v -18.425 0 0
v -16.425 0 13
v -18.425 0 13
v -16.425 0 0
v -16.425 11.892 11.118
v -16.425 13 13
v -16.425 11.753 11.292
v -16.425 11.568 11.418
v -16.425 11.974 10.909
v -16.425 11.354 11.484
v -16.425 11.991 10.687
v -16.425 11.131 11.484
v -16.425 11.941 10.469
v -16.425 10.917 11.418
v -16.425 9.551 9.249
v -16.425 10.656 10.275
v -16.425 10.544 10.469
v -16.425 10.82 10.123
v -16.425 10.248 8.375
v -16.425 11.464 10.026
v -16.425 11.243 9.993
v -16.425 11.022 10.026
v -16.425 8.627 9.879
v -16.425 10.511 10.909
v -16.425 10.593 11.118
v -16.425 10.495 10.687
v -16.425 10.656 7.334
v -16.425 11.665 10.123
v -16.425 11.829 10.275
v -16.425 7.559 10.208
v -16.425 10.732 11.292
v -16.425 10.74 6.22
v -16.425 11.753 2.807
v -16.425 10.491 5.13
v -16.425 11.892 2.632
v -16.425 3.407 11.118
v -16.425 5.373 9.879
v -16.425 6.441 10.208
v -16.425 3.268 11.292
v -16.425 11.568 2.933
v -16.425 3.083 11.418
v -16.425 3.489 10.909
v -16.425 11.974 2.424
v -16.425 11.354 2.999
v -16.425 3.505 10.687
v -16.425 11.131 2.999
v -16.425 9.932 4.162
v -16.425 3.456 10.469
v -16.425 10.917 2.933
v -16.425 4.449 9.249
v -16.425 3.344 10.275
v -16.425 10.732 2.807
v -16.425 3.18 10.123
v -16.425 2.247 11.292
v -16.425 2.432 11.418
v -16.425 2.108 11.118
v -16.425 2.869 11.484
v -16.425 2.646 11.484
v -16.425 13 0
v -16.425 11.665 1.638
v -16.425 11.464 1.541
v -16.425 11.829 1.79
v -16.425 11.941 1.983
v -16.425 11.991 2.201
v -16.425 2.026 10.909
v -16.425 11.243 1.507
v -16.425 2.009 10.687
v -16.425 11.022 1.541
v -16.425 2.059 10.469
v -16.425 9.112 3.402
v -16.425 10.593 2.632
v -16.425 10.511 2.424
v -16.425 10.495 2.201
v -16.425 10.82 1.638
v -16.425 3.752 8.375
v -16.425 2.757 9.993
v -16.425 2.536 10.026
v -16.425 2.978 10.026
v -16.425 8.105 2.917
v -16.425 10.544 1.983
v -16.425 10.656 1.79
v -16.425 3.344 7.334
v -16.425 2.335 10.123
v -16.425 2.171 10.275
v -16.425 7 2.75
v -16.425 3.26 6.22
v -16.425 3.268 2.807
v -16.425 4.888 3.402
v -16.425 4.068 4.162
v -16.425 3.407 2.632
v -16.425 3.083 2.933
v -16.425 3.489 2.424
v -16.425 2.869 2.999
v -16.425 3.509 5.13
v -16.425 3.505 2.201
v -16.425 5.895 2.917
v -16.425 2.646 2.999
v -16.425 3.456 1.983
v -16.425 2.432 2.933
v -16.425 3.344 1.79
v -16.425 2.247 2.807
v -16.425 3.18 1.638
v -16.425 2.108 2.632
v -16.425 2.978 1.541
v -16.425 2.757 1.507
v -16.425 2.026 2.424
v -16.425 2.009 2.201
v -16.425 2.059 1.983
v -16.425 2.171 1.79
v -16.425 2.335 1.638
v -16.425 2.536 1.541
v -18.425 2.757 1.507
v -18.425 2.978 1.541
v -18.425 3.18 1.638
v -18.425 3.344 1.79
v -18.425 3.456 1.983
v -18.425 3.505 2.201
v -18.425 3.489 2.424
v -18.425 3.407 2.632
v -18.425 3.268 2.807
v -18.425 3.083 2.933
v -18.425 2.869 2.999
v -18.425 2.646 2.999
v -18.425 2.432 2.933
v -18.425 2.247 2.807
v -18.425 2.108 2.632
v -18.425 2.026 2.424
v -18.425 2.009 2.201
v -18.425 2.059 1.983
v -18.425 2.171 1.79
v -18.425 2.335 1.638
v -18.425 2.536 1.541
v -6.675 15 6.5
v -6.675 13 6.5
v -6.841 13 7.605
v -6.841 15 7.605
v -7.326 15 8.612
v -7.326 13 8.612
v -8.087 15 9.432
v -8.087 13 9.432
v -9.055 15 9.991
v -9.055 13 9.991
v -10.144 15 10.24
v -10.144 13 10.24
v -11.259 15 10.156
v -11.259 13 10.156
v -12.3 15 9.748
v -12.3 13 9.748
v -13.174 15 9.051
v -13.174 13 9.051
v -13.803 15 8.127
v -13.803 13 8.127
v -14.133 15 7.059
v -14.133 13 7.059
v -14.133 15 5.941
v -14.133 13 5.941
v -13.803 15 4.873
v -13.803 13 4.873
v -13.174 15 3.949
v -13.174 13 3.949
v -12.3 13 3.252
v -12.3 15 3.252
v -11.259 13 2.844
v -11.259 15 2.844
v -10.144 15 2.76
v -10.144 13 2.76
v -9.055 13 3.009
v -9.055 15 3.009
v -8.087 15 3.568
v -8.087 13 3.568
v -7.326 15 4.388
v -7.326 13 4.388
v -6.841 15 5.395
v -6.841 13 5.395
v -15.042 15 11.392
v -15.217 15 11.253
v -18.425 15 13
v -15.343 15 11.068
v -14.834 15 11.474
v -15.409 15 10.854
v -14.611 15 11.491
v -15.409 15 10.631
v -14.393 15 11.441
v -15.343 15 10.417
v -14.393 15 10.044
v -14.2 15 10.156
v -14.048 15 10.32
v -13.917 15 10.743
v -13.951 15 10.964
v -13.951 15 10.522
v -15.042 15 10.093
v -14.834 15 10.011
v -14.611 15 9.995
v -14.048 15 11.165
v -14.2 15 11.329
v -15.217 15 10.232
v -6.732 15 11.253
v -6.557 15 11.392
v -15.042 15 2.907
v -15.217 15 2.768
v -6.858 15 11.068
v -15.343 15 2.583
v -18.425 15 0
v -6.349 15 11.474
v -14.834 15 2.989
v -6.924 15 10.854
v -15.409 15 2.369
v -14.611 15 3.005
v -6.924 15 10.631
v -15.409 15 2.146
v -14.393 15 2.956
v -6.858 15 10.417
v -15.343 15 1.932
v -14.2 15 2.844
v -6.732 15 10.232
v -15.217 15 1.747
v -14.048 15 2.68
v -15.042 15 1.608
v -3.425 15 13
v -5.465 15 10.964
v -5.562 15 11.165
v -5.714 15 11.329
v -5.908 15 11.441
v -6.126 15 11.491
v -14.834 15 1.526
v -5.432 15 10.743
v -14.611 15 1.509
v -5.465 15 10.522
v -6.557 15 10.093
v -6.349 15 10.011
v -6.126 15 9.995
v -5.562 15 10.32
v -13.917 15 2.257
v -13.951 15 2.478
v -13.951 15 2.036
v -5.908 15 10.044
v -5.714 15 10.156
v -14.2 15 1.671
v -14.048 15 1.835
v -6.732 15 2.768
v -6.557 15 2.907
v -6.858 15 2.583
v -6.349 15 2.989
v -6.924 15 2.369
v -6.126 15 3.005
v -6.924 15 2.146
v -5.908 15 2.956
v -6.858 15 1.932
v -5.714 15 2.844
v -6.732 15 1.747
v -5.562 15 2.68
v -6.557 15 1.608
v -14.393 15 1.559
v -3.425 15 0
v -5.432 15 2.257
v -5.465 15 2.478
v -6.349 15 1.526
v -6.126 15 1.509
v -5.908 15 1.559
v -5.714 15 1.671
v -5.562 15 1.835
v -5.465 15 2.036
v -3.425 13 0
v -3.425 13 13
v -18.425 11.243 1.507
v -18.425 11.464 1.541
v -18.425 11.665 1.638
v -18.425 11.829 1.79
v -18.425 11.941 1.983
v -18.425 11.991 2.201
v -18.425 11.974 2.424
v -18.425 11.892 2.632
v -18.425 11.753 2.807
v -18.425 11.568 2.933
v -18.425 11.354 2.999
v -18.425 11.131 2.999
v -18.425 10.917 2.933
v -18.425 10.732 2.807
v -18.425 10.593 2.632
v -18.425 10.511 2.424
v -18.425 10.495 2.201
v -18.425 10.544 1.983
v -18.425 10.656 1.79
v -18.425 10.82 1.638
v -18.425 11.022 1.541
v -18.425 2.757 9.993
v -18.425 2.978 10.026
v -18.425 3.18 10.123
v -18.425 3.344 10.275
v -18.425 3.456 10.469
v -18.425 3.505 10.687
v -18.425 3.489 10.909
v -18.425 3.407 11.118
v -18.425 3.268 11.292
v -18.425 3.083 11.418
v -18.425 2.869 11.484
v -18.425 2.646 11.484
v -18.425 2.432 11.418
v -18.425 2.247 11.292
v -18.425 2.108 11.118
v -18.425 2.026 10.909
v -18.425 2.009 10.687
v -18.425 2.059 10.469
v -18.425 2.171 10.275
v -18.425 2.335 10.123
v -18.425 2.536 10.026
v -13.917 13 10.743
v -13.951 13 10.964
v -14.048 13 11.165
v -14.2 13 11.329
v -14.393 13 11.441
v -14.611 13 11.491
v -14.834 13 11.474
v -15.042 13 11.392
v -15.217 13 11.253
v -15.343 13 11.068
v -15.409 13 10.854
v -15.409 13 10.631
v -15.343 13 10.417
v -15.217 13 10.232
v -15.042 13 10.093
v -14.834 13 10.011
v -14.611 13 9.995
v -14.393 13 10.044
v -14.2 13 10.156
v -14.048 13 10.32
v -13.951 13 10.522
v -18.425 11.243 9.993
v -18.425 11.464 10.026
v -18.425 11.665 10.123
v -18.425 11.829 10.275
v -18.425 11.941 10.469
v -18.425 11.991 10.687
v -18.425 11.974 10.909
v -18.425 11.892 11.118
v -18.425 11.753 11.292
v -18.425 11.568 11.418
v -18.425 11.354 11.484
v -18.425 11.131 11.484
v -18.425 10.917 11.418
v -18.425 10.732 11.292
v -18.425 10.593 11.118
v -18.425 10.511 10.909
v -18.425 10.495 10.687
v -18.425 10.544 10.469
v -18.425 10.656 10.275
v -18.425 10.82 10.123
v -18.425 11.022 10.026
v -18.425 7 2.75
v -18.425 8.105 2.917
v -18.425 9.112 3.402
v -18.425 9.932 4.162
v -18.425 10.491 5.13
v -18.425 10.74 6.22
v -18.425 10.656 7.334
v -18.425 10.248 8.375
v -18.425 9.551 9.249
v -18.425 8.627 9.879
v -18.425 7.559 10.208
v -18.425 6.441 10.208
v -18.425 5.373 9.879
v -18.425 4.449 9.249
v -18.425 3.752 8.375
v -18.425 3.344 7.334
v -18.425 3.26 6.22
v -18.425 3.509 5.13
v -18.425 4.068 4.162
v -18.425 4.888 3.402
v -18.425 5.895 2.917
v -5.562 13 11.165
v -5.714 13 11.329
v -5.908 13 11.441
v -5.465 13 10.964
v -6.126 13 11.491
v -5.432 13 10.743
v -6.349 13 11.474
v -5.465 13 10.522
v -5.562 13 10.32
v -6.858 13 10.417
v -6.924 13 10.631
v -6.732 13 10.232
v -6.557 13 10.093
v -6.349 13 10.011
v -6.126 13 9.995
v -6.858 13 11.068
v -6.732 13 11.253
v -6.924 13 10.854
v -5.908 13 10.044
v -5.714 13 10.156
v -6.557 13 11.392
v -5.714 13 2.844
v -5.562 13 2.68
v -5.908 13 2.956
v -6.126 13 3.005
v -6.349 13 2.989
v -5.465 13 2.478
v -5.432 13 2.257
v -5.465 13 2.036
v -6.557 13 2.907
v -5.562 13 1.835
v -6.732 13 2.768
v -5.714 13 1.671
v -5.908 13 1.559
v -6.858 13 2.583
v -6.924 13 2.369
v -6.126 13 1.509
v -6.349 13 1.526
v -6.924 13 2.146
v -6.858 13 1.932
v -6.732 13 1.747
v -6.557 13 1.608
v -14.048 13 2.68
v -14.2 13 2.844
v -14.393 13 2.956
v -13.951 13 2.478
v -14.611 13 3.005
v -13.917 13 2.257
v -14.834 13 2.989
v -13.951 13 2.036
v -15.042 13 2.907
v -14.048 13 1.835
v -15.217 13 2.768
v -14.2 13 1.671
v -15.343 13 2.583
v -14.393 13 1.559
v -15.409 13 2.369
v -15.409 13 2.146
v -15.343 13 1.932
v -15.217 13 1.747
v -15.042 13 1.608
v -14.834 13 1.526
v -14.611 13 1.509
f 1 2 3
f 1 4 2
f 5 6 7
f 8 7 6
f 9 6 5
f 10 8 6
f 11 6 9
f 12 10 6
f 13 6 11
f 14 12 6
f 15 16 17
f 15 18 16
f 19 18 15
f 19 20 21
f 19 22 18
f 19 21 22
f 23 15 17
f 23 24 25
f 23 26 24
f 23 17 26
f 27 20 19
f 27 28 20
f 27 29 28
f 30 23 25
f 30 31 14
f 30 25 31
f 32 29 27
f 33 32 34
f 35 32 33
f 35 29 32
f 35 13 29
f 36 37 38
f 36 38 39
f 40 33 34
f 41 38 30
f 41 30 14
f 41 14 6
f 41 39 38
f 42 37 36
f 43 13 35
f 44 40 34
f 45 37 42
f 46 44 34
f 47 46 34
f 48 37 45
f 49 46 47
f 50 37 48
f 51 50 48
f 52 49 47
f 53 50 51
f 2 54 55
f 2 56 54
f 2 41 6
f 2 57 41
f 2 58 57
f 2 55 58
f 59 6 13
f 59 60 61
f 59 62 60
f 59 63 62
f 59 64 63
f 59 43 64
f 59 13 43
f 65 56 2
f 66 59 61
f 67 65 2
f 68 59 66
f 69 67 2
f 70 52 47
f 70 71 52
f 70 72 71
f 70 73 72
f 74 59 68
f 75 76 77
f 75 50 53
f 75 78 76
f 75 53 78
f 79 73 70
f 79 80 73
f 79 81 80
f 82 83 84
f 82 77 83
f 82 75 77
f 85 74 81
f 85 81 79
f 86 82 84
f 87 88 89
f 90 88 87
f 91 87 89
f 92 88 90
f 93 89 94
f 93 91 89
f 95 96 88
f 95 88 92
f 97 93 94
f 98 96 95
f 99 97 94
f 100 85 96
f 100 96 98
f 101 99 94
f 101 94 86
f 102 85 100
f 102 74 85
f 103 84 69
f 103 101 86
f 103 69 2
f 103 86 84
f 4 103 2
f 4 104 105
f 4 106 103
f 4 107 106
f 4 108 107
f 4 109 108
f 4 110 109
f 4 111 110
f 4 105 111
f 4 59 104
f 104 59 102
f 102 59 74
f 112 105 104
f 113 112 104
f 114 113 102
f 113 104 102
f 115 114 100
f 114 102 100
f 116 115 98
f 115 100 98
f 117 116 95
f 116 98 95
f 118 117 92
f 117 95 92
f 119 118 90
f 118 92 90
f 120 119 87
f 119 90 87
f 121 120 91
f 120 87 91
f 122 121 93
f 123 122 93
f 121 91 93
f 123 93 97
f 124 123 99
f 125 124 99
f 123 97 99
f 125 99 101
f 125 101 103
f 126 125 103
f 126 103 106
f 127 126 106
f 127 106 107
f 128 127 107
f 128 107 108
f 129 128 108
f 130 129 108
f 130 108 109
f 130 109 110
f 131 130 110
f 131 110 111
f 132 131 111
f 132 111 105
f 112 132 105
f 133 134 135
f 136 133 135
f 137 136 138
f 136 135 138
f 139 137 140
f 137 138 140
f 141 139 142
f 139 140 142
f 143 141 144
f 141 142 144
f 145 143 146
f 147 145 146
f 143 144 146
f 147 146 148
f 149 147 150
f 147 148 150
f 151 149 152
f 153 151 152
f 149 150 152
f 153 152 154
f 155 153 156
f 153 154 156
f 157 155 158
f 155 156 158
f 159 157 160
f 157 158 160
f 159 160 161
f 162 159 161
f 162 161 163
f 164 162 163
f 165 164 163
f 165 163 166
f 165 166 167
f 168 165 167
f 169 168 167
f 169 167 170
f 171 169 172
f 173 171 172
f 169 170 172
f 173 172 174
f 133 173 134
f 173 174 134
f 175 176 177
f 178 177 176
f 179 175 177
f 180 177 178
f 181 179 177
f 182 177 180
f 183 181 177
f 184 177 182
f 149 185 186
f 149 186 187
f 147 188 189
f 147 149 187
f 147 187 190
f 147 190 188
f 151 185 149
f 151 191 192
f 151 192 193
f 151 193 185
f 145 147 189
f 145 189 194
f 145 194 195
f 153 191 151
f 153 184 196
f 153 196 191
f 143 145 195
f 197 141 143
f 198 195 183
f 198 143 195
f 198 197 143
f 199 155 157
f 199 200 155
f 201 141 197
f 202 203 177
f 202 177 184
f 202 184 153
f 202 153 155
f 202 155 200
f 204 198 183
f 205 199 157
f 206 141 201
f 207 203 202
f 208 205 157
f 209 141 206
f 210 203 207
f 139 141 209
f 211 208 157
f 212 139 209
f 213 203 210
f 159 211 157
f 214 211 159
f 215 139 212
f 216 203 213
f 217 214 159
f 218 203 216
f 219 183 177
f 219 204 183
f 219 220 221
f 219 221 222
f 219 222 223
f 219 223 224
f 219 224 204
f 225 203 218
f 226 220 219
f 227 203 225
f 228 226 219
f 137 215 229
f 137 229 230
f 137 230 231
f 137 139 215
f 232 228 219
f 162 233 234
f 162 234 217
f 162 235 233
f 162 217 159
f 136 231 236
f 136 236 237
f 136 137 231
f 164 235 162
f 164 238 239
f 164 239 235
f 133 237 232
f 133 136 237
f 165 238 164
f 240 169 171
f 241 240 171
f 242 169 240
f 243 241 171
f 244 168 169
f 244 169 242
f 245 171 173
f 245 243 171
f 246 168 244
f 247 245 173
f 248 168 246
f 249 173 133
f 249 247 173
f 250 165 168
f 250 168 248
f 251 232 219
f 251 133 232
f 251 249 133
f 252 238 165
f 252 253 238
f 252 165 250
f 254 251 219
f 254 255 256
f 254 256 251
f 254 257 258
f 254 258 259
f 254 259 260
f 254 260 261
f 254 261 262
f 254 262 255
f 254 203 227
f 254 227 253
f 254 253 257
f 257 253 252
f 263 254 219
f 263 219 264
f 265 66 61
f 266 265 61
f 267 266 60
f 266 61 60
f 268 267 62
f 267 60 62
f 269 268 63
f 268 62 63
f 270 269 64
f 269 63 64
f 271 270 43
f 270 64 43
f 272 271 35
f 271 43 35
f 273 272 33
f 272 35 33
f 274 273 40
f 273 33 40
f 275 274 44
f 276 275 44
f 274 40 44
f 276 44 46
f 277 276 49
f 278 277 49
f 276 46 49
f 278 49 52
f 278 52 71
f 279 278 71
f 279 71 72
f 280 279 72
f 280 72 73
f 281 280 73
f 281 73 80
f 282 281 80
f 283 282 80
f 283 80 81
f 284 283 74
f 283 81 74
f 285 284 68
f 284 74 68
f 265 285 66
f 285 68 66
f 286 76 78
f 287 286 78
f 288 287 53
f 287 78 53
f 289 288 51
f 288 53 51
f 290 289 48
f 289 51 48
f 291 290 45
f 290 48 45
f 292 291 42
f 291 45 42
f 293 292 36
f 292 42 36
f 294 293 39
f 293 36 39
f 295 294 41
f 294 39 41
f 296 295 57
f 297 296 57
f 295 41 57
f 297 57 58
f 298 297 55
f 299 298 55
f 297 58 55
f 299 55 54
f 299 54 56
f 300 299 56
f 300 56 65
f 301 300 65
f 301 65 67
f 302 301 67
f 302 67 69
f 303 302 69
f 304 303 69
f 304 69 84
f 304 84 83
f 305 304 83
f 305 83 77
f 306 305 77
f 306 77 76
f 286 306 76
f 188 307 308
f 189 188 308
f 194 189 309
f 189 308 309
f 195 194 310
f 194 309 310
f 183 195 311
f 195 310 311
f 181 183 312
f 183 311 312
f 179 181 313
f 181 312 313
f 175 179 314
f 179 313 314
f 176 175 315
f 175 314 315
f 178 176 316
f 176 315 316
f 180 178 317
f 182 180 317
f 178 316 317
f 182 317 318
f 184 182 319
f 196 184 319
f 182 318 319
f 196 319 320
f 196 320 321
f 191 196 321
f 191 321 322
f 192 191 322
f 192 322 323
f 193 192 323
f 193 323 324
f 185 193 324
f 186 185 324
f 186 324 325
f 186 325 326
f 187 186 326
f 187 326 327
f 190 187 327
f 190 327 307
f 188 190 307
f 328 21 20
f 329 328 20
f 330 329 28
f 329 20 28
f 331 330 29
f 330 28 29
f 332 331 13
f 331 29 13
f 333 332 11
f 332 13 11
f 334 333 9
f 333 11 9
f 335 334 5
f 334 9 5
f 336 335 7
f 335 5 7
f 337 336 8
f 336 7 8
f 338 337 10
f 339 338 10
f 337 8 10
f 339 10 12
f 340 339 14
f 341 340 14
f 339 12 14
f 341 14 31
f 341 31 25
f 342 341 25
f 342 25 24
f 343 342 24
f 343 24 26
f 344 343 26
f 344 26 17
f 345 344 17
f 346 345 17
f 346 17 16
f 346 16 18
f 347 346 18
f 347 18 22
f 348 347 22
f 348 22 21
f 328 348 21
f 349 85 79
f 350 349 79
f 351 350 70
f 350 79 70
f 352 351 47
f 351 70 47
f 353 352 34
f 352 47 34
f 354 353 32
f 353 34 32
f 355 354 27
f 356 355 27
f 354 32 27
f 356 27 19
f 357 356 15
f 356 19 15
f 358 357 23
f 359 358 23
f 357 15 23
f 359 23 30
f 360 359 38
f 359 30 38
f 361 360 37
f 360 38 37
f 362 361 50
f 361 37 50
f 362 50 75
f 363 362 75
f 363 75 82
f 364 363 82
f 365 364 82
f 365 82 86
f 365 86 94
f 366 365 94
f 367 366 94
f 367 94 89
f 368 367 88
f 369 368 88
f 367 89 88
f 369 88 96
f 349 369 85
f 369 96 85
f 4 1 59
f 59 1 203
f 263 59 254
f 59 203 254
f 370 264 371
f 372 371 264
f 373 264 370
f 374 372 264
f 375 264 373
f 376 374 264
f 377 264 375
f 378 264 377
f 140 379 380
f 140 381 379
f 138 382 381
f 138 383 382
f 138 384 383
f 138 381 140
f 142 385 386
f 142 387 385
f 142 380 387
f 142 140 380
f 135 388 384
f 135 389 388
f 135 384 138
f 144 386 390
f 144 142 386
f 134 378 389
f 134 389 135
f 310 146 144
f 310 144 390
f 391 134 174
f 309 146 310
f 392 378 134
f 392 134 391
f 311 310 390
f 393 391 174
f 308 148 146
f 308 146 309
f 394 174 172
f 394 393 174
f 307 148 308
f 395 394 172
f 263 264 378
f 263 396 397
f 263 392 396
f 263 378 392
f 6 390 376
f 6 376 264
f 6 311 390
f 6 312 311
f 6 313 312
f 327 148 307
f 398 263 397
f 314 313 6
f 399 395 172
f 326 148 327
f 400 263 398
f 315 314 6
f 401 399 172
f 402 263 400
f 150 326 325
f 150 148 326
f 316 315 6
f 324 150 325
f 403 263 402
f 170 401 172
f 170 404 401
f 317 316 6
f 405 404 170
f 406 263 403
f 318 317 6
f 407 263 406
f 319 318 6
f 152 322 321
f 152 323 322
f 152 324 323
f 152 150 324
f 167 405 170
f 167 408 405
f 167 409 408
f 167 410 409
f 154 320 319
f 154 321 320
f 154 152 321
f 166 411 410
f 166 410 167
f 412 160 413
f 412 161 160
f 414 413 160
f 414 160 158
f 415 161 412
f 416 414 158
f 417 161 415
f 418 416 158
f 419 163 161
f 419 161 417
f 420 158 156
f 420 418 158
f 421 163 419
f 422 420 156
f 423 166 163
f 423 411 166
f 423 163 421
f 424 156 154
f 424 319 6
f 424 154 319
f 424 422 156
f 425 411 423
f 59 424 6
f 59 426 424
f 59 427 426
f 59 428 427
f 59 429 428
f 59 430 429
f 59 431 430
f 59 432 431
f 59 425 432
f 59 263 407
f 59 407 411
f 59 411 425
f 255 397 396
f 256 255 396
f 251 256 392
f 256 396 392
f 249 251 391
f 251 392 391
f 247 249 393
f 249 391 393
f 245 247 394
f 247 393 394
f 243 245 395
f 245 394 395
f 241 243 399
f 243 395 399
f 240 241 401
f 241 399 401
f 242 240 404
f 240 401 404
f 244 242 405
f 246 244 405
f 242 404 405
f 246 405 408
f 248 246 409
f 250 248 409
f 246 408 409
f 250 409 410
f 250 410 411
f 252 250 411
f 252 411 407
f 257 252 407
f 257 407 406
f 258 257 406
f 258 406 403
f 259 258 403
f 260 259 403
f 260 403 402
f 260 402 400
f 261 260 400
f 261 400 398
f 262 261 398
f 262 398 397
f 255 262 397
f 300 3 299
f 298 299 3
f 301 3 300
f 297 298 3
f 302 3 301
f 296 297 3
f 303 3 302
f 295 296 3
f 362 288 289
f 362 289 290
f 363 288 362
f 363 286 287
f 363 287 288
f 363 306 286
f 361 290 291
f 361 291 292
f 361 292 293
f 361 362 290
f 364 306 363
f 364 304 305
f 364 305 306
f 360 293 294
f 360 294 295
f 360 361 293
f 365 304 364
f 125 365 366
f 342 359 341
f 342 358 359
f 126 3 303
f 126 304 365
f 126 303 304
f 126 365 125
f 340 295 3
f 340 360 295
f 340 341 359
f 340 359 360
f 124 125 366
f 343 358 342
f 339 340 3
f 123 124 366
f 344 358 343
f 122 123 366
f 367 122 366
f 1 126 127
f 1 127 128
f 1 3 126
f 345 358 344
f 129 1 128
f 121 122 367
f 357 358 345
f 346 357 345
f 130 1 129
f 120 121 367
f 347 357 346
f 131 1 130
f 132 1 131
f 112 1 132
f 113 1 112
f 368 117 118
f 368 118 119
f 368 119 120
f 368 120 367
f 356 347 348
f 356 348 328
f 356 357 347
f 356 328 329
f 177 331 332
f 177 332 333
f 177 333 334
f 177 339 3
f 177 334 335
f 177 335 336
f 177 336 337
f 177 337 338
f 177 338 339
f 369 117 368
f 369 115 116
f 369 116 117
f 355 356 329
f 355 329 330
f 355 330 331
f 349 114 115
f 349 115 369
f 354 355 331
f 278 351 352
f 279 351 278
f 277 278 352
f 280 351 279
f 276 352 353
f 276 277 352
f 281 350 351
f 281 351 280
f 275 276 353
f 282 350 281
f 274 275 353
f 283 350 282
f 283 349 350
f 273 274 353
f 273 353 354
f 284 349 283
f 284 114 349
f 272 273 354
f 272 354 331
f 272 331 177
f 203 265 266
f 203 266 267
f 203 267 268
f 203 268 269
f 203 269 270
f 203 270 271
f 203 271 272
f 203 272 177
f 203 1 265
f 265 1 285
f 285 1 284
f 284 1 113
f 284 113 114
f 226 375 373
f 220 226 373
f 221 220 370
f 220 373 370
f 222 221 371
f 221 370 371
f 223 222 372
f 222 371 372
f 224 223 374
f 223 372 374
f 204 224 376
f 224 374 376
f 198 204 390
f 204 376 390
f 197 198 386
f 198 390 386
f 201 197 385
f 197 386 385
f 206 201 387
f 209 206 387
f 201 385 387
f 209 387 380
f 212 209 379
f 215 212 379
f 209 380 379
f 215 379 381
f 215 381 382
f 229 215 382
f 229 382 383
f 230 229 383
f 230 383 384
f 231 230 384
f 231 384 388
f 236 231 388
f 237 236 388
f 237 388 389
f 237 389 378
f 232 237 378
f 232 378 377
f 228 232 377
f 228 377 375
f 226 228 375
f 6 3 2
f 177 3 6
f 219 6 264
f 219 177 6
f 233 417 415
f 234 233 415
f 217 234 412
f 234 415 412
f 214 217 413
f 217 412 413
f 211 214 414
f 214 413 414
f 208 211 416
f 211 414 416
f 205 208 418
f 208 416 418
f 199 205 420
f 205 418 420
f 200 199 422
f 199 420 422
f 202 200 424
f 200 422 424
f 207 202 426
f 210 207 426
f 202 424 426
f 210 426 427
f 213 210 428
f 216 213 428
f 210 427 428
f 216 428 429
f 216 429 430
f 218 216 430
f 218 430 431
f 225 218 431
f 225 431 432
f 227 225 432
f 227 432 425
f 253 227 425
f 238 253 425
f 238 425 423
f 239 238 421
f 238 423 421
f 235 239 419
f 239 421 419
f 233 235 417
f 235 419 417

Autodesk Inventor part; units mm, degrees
ref_plane "YZ Plane" through (0, 0, 0) normal (1, 0, 0) x (0, 1, 0)
ref_plane "XZ Plane" through (0, 0, 0) normal (0, 1, 0) x (-1, 0, 0)
ref_plane "XY Plane" through (0, 0, 0) normal (0, 0, 1) x (1, 0, 0)
ref_plane "Work Plane1" through (-18.4246, 0, 0) normal (0, 0, 1) x (1, 0, 0)
sketch "Sketch1" plane through (-18.4246, 0, 0) normal (0, 0, 1) x (1, 0, 0)
  line L0 (0, -0.9373) -> (0, 15) projected
  line L1 (0, 15) -> (15.9373, 15) projected
  line L2 (0, -0.9373) -> (0, 19.0627)
  line L3 (15.9373, 15) -> (-4.0627, 15)
  line L4 (0, 15) -> (2, 15)
  line L5 (2, 15) -> (2, 0)
  line L6 (2, 0) -> (0, 0)
  line L7 (0, 0) -> (0, 15)
  line L8 (0, 15) -> (15, 15)
  line L9 (15, 15) -> (15, 13)
  line L10 (15, 13) -> (0, 13)
  line L11 (0, 13) -> (0, 15)
  point P0 (18.4246, 0)
  point P1 (0, 0)
  point P2 (2, 13)
  point P3 (15, 15)
  dimension "d0" = 20
  dimension "d1" = 20
  dimension "d2" = 2
  dimension "d3" = 15
  dimension "d4" = 15
  dimension "d5" = 2
extrude "Extrusion1" add sketch "Sketch1" along normal blind 13
sketch "Sketch2" plane through (-16.4246, 0, 0) normal (1, 0, 0) x (0, 0, -1)
  circle A0 centre (-10.7426, 2.7574) radius 0.75 projected
  circle A1 centre (-10.7426, 11.2426) radius 0.75 projected
  circle A2 centre (-2.2574, 2.7574) radius 0.75 projected
  circle A3 centre (-2.2574, 11.2426) radius 0.75 projected
  point P0 (0, 0)
extrude "Extrusion2" cut sketch "Sketch2" against normal blind 13
sketch "Sketch3" plane through (-16.4246, 13, 0) normal (0, -1, 0) x (1, 0, 0)
  circle A0 centre (1.7574, 10.7426) radius 0.75 projected
  circle A1 centre (10.2426, 10.7426) radius 0.75 projected
  circle A2 centre (10.2426, 2.2574) radius 0.75 projected
  circle A3 centre (1.7574, 2.2574) radius 0.75 projected
  point P0 (16.4246, 0)
extrude "Extrusion3" cut sketch "Sketch3" against normal blind 13
sketch "Sketch4" plane through (-16.4246, 0, 0) normal (1, 0, 0) x (0, 0, -1)
  point P0 (0, 0)
sketch "Sketch5" plane through (-16.4246, 0, 0) normal (1, 0, 0) x (0, 0, -1)
  circle A0 centre (-6.5, 7) radius 1.5 projected
  circle A1 centre (-6.5, 7) radius 3.75
  point P0 (0, 0)
  dimension "d12" = 7.5
extrude "Extrusion4" cut sketch "Sketch5" against normal blind 13 contours A0 | A1
sketch "Sketch6" plane through (-16.4246, 13, 0) normal (0, -1, 0) x (1, 0, 0)
  circle A0 centre (6, 6.5) radius 1.5 projected
  circle A1 centre (6, 6.5) radius 3.75
  point P0 (16.4246, 0)
  dimension "d15" = 7.5
extrude "Extrusion5" cut sketch "Sketch6" against normal blind 13 contours A0 | A1
properties part number "base_1"
